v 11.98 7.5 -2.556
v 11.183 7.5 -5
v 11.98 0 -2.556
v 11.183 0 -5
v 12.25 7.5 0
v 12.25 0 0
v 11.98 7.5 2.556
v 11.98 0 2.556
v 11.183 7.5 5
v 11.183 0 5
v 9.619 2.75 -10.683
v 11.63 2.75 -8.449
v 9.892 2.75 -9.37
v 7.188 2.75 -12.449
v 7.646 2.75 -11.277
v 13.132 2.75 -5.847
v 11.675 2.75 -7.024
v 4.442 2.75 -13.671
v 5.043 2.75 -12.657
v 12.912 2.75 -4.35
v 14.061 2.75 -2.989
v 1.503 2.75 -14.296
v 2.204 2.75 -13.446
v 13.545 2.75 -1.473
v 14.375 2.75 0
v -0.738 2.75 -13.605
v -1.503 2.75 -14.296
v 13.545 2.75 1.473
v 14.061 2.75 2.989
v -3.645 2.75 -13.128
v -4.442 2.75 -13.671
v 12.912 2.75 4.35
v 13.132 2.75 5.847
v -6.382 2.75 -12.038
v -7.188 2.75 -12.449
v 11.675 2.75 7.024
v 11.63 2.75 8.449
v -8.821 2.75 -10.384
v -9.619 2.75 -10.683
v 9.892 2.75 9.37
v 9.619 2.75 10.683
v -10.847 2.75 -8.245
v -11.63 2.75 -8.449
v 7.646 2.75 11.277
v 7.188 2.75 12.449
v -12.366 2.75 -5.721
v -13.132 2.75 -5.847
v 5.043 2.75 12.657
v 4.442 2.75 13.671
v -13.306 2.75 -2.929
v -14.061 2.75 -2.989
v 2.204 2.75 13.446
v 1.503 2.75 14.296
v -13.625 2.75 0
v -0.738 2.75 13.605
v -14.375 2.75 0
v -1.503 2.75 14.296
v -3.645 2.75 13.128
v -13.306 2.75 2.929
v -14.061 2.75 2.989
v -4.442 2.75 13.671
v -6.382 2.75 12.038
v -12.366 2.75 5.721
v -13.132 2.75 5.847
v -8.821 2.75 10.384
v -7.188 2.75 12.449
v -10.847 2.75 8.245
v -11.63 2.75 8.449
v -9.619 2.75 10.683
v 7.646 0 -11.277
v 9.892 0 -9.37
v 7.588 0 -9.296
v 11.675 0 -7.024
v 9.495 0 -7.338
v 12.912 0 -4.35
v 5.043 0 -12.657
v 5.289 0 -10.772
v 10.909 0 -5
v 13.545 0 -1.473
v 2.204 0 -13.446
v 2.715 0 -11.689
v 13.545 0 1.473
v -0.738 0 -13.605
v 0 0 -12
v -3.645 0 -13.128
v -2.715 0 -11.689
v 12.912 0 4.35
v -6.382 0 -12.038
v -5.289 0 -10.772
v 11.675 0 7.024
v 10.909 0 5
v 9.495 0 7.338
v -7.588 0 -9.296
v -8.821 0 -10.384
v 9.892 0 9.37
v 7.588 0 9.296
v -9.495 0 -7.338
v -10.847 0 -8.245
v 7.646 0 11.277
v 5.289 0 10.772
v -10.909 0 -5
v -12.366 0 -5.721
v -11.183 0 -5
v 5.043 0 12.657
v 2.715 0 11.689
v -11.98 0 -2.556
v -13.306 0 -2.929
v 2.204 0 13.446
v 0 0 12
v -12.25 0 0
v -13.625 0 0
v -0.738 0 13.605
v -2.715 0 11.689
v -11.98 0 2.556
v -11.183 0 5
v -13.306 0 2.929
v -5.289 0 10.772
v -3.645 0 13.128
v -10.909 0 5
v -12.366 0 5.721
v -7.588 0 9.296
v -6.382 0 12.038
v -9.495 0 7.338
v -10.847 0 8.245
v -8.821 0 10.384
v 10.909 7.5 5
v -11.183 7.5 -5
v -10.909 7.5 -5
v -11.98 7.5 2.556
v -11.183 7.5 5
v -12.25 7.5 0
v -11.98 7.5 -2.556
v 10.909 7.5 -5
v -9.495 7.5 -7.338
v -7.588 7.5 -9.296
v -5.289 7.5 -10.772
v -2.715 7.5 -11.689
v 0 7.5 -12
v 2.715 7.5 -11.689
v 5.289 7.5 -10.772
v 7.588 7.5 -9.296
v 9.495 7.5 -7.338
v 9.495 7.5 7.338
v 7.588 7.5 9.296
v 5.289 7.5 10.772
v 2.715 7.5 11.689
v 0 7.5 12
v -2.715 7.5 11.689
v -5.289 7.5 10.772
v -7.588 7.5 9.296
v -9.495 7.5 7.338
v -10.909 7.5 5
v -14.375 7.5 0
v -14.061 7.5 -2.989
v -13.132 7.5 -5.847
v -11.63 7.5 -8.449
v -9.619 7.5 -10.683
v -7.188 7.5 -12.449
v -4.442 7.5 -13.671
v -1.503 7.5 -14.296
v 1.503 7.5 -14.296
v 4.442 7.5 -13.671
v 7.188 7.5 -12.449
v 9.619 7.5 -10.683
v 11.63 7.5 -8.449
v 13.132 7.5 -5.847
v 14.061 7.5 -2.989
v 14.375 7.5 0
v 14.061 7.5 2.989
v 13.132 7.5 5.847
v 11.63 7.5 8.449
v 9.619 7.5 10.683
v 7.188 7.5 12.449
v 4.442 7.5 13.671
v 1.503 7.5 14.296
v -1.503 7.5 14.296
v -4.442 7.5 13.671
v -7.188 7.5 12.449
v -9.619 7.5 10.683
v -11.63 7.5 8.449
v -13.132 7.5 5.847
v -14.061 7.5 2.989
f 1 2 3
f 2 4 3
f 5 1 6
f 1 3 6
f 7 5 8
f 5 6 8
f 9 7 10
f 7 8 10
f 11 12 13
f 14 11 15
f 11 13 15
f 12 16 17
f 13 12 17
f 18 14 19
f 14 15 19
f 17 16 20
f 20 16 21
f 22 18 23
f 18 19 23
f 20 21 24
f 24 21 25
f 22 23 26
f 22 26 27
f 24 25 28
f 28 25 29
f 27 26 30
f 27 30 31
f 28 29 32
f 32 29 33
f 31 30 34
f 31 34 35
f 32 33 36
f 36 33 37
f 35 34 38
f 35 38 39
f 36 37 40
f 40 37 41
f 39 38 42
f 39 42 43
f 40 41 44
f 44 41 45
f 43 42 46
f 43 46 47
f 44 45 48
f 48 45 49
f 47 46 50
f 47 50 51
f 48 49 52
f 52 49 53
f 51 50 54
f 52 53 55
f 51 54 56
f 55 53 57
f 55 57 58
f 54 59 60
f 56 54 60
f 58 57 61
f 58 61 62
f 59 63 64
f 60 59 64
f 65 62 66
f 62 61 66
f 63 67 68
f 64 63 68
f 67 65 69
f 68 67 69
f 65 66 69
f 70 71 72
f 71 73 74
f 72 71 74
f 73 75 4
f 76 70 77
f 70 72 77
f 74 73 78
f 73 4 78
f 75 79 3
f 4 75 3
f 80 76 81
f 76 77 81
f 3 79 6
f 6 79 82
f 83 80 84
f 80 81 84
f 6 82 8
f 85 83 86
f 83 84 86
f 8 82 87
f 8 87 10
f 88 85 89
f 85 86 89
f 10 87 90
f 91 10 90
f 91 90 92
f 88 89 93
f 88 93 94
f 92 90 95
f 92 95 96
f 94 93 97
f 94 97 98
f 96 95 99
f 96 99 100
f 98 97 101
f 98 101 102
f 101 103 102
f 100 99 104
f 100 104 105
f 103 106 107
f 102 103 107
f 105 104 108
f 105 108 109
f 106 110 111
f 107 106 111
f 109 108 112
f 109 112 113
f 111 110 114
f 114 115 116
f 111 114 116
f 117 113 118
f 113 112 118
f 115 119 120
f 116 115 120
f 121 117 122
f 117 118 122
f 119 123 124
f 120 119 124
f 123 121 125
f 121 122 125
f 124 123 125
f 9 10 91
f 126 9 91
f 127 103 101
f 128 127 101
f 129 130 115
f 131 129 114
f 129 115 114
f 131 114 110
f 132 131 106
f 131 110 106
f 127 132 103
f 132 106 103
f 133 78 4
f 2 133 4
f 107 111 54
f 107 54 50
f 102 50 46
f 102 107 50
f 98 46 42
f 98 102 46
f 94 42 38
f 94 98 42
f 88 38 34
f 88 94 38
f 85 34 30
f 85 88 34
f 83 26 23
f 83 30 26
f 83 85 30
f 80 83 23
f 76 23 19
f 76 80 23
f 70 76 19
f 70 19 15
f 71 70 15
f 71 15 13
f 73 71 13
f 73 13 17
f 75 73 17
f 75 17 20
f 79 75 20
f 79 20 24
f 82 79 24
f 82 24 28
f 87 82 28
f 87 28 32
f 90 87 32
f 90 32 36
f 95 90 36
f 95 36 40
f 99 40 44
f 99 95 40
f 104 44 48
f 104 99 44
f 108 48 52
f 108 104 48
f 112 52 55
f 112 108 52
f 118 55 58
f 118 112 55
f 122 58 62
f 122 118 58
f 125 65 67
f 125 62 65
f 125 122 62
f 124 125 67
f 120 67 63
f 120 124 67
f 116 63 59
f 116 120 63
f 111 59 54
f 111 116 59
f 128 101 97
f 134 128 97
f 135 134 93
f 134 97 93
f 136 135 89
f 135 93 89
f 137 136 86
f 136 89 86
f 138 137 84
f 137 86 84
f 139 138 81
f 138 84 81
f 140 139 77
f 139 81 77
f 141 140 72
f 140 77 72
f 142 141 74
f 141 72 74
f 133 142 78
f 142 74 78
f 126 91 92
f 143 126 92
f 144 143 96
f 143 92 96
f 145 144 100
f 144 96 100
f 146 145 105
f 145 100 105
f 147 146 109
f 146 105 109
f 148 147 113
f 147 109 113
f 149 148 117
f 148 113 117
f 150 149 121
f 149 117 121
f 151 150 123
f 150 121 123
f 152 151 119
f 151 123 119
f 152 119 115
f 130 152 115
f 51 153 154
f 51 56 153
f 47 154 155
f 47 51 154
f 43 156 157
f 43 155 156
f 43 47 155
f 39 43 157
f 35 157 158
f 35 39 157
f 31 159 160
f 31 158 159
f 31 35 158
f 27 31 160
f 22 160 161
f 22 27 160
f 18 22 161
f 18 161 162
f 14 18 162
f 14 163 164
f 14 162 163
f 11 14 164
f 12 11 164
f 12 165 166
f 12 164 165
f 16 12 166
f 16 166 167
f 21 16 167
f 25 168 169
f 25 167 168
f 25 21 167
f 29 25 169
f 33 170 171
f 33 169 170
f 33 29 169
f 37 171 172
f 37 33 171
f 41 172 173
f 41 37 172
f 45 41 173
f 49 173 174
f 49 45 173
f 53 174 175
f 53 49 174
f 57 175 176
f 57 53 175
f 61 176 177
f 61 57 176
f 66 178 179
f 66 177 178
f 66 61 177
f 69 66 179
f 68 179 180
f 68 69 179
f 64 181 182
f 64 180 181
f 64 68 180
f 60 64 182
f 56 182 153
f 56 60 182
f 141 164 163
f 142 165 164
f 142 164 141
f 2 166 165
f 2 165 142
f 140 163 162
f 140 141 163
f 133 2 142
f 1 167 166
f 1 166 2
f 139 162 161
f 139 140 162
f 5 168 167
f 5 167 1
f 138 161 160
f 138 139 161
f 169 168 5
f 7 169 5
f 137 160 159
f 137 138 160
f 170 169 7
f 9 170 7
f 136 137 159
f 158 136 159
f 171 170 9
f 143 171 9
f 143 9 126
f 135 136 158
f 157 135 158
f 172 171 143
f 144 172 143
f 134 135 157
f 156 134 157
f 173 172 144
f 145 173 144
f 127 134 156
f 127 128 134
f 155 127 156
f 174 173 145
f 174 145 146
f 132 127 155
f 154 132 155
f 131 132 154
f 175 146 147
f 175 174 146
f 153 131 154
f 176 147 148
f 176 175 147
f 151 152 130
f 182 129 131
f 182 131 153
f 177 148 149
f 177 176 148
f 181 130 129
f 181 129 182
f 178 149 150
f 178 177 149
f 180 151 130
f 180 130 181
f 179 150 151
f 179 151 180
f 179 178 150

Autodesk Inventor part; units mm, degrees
ref_plane "YZ Plane" through (0, 0, 0) normal (1, 0, 0) x (0, 1, 0)
ref_plane "XZ Plane" through (0, 0, 0) normal (0, 1, 0) x (-1, 0, 0)
ref_plane "XY Plane" through (0, 0, 0) normal (0, 0, 1) x (1, 0, 0)
sketch "Sketch1" plane through (0, 0, 0) normal (0, 1, 0) x (-1, 0, 0)
  circle A0 centre (0, 0) radius 14.375
  circle A1 centre (0, 0) radius 12
  circle A2 centre (0, 0) radius 13.625
  circle A3 centre (0, 0) radius 12.25
  line L0 (12.25, -5) -> (-12.25, -5)
  line L1 (-12.25, -5) -> (-12.25, 5)
  line L2 (-12.25, 5) -> (12.25, 5)
  line L3 (12.25, 5) -> (12.25, -5)
  line L4 (12.25, -5) -> (-12.25, 5) construction
  line L5 (-12.25, -5) -> (12.25, 5) construction
  point P0 (-10.9087, 5)
  point P1 (-11.1831, 5)
  point P2 (-11.1831, -5)
  point P3 (-10.9087, -5)
  point P4 (11.1831, 5)
  point P5 (10.9087, 5)
  point P6 (10.9087, -5)
  point P7 (11.1831, -5)
  dimension "d0" = 28.75
  dimension "d1" = 24
  dimension "d4" = 27.25
  dimension "d9" = 24.5
  dimension "d10" = 10
extrude "Extrusion1" add sketch "Sketch1" along normal blind 7.5 contours A0 | A1 L2 A3 L0 | A1 L2 A3 | L0 A3 A1 | A1 L0 A3 L2 | L2 L3 A3 | A3 L3 L0 | A3 L1 L2 | L0 L1 A3 | A2
extrude "Extrusion2" cut sketch "Sketch1" along normal blind 2.75 contours A0
thread "Thread1" size "M24x0.75" class "6H" standard "ANSI Metric M Profile" full length
extrude "Extrusion3" cut sketch "Sketch1" along normal through all contours A1 L2 A3 L0 | A1 L0 A3 L2
properties part number "Bottom Nut" material "ABS Plastic"
